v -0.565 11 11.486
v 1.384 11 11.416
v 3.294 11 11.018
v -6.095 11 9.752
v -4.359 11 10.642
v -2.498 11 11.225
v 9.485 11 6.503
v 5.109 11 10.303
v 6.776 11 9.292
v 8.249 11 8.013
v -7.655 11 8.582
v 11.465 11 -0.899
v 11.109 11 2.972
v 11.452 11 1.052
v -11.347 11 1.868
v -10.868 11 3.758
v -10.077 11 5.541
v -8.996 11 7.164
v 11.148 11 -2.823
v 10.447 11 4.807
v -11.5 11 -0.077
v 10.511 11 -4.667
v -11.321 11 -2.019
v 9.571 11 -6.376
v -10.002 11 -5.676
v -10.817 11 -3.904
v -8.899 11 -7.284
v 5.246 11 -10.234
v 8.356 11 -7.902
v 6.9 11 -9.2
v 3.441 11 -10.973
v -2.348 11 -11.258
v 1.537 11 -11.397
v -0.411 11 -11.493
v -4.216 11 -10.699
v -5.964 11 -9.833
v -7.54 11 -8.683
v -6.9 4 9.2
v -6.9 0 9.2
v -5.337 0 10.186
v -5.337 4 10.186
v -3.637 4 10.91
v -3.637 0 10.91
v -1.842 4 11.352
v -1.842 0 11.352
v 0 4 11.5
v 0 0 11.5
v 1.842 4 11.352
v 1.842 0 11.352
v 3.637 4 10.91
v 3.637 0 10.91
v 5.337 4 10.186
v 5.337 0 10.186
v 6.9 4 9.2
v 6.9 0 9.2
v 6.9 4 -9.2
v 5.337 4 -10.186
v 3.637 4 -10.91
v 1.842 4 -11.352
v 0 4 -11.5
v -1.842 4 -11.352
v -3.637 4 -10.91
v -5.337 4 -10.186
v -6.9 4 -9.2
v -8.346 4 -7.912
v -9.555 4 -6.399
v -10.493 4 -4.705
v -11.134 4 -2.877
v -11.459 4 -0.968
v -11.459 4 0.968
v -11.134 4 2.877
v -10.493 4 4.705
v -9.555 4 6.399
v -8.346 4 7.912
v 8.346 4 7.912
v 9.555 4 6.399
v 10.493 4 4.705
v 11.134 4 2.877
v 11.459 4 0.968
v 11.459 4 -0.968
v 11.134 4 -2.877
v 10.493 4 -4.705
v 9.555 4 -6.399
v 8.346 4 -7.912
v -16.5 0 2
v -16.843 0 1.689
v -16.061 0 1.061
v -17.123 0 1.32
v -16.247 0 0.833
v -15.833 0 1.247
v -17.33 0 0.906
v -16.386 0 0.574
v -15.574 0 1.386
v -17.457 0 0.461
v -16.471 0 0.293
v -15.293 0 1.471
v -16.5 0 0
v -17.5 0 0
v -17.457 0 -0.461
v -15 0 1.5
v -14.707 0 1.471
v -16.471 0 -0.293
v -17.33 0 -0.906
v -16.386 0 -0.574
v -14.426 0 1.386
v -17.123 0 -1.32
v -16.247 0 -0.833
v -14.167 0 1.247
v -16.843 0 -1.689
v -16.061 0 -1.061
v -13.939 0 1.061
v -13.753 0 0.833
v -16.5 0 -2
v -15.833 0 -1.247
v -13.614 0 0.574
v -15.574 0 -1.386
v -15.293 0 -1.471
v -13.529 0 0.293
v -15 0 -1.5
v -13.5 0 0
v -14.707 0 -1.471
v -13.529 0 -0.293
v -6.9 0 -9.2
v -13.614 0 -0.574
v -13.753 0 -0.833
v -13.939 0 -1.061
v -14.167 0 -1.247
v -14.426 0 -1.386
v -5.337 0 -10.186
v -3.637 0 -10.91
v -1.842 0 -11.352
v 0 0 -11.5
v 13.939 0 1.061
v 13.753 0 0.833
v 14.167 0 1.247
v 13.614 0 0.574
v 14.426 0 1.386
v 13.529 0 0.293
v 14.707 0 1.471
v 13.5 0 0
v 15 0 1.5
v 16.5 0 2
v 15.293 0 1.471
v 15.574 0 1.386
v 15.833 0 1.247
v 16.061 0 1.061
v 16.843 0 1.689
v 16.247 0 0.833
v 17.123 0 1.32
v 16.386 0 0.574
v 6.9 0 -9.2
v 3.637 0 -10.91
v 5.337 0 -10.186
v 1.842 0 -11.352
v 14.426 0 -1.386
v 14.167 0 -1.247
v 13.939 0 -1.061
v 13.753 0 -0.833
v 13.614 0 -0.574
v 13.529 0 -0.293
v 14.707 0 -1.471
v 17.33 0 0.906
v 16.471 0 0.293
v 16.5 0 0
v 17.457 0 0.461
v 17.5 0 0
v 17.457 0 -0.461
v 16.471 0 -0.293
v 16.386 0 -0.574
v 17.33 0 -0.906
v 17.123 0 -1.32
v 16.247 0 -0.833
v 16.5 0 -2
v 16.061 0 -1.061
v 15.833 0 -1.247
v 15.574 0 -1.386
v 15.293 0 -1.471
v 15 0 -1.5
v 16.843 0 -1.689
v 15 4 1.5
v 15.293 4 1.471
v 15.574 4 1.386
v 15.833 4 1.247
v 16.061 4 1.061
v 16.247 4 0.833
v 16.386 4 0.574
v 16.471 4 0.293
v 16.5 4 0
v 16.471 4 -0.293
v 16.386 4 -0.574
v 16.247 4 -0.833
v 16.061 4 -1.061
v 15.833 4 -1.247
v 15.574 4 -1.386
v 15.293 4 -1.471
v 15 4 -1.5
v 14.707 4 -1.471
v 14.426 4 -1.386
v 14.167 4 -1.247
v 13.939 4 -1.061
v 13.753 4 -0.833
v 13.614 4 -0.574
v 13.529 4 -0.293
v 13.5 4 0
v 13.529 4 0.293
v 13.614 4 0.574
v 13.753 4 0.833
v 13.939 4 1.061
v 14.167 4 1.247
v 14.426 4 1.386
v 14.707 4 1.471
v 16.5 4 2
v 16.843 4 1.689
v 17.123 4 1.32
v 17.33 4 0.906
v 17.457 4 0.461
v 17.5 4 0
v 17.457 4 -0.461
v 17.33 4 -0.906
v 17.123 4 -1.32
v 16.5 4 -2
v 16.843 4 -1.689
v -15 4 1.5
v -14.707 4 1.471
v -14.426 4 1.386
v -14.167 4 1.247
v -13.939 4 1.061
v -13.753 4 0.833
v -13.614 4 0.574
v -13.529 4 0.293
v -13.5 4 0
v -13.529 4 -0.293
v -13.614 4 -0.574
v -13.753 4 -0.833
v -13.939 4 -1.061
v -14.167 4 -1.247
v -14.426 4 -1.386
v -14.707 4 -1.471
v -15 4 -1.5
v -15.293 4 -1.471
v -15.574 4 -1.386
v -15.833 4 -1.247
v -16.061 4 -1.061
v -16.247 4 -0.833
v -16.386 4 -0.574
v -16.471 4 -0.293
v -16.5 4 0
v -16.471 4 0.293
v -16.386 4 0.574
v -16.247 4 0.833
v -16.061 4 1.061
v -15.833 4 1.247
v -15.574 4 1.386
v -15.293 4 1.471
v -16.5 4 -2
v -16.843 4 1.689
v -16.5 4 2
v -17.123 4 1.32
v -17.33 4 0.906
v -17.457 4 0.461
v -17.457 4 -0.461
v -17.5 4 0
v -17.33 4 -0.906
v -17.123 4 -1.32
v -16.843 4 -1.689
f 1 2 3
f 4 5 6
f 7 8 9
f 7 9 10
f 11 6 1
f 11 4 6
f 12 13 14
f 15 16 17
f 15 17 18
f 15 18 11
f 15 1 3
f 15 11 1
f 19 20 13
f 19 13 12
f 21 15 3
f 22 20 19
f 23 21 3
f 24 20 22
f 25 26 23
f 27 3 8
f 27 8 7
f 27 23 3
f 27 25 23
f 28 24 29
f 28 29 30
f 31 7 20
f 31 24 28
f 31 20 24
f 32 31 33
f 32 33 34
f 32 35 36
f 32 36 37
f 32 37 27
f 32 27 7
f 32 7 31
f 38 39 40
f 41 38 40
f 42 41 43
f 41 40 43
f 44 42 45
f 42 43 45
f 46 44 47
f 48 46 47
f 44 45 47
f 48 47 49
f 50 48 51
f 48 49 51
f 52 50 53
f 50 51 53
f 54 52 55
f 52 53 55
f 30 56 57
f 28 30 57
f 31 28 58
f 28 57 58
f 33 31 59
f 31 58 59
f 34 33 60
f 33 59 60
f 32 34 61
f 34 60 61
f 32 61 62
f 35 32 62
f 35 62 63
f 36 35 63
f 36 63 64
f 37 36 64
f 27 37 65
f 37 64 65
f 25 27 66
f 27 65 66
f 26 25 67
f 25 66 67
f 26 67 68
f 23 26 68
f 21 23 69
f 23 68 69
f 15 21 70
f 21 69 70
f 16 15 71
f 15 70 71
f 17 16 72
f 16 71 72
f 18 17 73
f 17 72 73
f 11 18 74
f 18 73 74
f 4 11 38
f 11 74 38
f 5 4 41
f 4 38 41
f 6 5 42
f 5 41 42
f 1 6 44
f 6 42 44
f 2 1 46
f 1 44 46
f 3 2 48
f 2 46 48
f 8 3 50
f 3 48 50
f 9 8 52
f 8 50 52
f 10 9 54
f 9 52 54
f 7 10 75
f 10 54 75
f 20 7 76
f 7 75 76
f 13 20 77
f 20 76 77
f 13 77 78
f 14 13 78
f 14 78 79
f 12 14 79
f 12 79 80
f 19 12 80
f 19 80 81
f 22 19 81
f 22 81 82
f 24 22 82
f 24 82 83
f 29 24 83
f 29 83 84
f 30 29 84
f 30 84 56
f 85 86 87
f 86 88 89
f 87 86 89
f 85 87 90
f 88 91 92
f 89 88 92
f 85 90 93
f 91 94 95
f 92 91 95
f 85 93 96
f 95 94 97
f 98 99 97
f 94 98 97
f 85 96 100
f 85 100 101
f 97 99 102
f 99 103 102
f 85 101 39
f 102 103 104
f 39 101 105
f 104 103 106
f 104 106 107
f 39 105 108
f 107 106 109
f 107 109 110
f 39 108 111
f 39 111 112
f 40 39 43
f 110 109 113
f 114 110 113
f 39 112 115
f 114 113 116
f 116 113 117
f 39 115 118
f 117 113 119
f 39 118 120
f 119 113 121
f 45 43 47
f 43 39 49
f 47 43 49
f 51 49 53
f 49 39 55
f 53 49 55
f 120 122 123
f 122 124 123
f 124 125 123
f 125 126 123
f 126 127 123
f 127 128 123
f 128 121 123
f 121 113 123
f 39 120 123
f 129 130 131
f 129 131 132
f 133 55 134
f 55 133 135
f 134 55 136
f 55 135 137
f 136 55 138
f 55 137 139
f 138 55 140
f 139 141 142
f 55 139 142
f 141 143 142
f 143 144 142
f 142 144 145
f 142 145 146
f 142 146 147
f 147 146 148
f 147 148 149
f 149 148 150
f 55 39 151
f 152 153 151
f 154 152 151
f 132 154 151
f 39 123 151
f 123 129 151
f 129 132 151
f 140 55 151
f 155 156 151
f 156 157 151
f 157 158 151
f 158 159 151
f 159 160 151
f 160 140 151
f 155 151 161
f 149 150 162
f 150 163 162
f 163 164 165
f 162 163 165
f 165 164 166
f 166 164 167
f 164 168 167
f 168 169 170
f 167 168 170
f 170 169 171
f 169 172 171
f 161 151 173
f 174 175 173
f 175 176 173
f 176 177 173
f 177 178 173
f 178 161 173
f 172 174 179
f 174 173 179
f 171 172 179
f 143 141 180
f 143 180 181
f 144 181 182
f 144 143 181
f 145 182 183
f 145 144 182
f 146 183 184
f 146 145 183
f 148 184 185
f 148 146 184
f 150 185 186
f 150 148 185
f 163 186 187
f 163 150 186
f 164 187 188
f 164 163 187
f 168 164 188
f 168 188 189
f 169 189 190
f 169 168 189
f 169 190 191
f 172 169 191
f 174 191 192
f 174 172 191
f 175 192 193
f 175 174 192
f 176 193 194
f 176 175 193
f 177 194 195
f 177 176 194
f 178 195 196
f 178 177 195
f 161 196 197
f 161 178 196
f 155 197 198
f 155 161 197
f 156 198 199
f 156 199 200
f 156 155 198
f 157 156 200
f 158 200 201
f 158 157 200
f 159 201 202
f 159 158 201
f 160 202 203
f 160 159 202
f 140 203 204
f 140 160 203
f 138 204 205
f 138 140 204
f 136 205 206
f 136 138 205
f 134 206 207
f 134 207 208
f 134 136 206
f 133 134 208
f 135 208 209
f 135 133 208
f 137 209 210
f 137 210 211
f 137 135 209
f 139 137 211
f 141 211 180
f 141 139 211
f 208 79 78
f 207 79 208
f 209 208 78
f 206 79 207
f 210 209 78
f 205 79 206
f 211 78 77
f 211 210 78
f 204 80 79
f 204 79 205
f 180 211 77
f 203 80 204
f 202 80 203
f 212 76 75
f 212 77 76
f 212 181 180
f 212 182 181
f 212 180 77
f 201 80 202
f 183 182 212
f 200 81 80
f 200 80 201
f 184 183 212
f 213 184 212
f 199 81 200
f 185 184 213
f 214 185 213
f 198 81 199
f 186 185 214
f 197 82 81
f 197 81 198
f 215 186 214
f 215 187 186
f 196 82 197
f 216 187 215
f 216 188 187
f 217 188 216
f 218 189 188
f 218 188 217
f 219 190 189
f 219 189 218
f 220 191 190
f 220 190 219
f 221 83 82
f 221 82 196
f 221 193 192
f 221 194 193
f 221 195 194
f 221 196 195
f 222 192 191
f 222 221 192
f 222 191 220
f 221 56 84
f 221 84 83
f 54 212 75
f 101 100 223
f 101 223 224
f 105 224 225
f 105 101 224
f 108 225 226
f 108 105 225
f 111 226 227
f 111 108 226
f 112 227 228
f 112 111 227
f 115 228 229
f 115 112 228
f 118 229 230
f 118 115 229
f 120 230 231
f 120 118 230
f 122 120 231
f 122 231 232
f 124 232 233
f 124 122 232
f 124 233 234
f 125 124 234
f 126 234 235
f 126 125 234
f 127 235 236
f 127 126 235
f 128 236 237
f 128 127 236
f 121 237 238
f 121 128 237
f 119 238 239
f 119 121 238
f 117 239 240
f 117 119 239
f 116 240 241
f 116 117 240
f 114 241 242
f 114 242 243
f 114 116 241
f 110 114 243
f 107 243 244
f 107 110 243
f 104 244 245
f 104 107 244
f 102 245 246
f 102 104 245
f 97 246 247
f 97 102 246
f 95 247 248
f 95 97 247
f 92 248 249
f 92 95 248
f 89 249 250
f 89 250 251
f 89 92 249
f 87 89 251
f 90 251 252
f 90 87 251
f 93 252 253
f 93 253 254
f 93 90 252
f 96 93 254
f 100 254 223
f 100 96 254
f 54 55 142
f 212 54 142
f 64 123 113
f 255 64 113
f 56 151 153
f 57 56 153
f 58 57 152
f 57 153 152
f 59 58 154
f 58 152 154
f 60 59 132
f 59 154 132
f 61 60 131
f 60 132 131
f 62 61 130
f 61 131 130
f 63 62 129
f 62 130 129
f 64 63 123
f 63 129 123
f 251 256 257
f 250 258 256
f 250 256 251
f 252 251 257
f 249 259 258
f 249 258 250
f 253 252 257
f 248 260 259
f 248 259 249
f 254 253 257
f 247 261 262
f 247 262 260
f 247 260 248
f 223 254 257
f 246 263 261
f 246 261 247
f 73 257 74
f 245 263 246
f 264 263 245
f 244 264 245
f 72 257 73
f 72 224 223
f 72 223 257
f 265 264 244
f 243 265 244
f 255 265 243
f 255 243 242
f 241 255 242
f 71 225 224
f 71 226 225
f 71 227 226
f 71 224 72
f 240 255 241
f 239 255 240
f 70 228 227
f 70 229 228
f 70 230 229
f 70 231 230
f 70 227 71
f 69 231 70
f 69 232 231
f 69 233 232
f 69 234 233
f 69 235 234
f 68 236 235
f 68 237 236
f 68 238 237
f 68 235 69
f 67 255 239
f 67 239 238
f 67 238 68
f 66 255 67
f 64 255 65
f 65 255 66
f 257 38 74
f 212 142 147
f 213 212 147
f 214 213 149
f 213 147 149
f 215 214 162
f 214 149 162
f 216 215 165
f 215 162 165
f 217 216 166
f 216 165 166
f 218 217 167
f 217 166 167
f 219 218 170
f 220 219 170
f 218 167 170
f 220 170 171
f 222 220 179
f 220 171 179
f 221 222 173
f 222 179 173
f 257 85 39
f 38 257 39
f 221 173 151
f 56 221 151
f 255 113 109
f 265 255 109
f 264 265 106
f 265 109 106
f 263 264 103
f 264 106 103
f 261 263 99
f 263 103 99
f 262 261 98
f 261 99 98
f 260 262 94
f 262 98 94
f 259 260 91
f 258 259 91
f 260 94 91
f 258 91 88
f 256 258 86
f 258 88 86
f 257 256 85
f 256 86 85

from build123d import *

# Parameters (mm, degrees)
CROQUIS1_R              = 1.5
SALIENTE_EXTRUIR1_DEPTH = 4
CROQUIS2_R              = 11.5
SALIENTE_EXTRUIR2_DEPTH = 7


with BuildPart() as part:
    # Croquis1 → Saliente-Extruir1 (new body)
    with BuildSketch(Plane(origin=(0, 0, 0), x_dir=(1, 0, 0), z_dir=(0, 1, 0))):
        with BuildLine():
            Line((16.5, 2), (6.9, 9.2))
            ThreePointArc((6.9, 9.2), (0, 11.5), (-6.9, 9.2))
            Line((-6.9, 9.2), (-16.5, 2))
            ThreePointArc((-16.5, 2), (-17.5, 0), (-16.5, -2))
            Line((-16.5, -2), (-6.9, -9.2))
            ThreePointArc((-6.9, -9.2), (0, -11.5), (6.9, -9.2))
            Line((6.9, -9.2), (16.5, -2))
            ThreePointArc((16.5, -2), (17.5, 0), (16.5, 2))
        make_face()
        with Locations(Location((-15, 0, 0), (0, 0, 270))):
            Circle(CROQUIS1_R, mode=Mode.SUBTRACT)
        with Locations(Location((15, 0, 0), (0, 0, 270))):
            Circle(CROQUIS1_R, mode=Mode.SUBTRACT)
    extrude(amount=SALIENTE_EXTRUIR1_DEPTH)

    # Croquis2 → Saliente-Extruir2 (add)
    with BuildSketch(Plane(origin=(0, 4, 0), x_dir=(1, 0, 0), z_dir=(0, 1, 0))):
        with Locations(Location((0, 0, 0), (0, 0, 53.130102354))):
            Circle(CROQUIS2_R)
    extrude(amount=SALIENTE_EXTRUIR2_DEPTH)


solid = part.part
